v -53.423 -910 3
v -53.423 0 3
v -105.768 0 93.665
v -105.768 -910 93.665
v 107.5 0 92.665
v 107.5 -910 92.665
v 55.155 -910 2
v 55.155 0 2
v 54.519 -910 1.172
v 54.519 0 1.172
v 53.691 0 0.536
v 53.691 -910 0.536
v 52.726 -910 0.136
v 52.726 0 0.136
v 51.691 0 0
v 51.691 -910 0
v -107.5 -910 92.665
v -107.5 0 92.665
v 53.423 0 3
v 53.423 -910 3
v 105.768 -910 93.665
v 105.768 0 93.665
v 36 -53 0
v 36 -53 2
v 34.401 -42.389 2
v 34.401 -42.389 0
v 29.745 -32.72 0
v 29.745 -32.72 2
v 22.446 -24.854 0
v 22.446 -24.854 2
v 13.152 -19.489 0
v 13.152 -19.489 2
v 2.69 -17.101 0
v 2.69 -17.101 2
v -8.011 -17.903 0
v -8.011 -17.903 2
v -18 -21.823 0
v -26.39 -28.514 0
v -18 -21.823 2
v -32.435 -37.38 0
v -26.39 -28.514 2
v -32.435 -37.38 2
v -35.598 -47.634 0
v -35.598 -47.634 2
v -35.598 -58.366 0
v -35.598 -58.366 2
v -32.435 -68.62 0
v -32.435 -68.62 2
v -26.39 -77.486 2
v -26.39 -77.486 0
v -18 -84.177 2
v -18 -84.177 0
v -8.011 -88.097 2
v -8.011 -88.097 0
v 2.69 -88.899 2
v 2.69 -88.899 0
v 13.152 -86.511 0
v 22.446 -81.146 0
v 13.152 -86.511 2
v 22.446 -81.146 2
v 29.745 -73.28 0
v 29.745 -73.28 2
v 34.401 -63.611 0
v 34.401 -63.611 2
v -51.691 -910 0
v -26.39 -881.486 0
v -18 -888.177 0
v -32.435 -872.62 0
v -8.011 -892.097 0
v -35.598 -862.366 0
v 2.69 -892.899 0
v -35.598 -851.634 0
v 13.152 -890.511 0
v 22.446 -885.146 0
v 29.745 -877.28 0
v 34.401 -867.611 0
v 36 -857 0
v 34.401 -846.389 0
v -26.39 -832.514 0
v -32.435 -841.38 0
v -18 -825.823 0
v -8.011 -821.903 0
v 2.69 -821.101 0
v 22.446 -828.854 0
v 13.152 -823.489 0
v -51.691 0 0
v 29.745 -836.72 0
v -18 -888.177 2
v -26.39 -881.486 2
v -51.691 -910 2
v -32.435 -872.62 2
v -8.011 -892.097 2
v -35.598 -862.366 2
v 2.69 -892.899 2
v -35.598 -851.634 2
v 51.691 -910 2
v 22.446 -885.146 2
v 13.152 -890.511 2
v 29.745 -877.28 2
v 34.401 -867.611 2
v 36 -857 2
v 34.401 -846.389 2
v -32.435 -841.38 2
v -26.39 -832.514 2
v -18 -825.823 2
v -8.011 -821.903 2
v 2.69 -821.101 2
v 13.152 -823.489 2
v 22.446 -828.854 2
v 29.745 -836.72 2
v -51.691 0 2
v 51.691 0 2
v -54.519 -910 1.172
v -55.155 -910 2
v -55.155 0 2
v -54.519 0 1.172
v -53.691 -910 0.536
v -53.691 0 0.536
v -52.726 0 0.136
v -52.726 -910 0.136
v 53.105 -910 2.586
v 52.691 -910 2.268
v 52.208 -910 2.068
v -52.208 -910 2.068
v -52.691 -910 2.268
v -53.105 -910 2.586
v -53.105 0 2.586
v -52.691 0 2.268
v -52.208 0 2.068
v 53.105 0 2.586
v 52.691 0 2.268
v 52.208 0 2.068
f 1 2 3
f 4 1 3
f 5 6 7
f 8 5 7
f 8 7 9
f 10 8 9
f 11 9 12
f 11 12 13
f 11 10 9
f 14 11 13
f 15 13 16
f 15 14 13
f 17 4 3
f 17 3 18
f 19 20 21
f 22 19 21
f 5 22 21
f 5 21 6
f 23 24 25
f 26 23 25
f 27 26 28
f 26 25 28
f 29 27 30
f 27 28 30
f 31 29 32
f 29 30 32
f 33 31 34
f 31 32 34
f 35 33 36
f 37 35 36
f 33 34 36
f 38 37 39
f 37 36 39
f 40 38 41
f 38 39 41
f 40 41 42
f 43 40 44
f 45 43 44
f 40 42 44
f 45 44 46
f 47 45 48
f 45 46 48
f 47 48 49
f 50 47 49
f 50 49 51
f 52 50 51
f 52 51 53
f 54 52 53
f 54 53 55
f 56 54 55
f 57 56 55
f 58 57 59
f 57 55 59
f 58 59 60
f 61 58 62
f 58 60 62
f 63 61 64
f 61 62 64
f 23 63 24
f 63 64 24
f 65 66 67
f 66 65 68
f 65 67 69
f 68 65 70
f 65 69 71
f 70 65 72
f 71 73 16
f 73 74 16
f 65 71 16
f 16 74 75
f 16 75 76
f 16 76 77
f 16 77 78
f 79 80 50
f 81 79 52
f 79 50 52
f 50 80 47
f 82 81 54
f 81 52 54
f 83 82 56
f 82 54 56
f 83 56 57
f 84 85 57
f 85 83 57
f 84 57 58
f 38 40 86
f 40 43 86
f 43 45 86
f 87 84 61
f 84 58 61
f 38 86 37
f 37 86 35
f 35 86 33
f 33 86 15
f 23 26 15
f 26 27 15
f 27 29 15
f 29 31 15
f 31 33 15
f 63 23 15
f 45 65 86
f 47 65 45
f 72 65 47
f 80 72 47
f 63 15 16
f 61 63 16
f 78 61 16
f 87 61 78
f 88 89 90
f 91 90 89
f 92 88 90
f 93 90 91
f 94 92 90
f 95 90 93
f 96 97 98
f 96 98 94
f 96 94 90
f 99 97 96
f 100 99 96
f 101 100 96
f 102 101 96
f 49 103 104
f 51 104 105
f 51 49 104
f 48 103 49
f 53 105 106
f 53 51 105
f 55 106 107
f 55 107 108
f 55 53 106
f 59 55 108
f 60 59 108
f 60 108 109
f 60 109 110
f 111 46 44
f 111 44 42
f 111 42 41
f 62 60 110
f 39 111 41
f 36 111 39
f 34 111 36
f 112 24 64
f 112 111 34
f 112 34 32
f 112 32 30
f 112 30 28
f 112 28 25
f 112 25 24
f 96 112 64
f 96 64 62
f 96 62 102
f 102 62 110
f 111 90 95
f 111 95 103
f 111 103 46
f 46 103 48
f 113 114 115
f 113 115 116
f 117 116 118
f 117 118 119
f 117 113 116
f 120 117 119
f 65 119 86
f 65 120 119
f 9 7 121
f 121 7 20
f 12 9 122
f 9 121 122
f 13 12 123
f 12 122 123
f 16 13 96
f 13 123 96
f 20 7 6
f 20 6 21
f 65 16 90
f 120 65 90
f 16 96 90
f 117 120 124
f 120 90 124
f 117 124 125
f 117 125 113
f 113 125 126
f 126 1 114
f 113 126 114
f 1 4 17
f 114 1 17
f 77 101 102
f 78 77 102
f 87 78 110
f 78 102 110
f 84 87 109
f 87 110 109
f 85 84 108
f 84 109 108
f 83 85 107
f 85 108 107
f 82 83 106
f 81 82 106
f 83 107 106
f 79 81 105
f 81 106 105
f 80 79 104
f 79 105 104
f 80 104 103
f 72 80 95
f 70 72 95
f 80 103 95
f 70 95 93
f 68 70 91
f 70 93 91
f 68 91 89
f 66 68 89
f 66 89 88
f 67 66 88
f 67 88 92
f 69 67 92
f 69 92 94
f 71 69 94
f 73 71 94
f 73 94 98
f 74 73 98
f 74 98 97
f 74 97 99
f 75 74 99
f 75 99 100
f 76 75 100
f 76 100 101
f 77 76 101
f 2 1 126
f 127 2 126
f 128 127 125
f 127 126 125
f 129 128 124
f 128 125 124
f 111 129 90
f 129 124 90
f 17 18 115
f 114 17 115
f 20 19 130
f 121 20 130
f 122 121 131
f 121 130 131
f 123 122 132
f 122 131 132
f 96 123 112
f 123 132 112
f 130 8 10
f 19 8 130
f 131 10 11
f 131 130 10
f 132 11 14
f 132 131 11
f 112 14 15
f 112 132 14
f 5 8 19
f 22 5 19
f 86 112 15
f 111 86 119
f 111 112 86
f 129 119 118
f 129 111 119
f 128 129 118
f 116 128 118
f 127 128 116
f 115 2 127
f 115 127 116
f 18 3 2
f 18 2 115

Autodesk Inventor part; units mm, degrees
ref_plane "YZ Plane" through (0, 0, 0) normal (1, 0, 0) x (0, 1, 0)
ref_plane "XZ Plane" through (0, 0, 0) normal (0, 1, 0) x (-1, 0, 0)
ref_plane "XY Plane" through (0, 0, 0) normal (0, 0, 1) x (1, 0, 0)
sketch "Sketch9" plane through (0, 0, 0) normal (0, 0, 1) x (1, 0, 0)
  line L0 (-54, 0) -> (54, 0)
  line L1 (54, 0) -> (54, -910)
  line L2 (54, -910) -> (-54, -910)
  line L3 (-54, -910) -> (-54, 0)
  point P0 (0, 0)
  point P1 (0, 0)
  dimension "d49" = 108
  dimension "d50" = 910
extrude "Plate4" add sketch "Sketch9" along normal blind 2
sketch "Sketch10" plane through (52.2679, 0, 1) normal (0.8660254, 0, -0.5) x (0, 1, 0)
  line L0 (-910, 0) -> (0, 0)
  line L1 (0, 0) -> (0, 107)
  line L2 (0, 107) -> (-910, 107)
  line L3 (-910, 107) -> (-910, 0)
edge flange "Flange2" height 107 angle 60 thickness 2 bend radius 2 thickness toward (0.8660254, 0, -0.5) relief tear relief width 2 relief depth 1 corner gap 2 corner form 0 edges at (54, -455, 2) (-54, -455, 2) wall of the first edge with corners at (52.2679, -910, 1) (52.2679, 0, 1) (105.7679, 0, 93.6647) (105.7679, -910, 93.6647)
bend "Bend2"
corner "Corner2"
sketch "Sketch11" plane through (0, 0, 2) normal (0, 0, 1) x (1, 0, 0)
  circle A0 centre (0, -53) radius 36
  circle A1 centre (0, -857) radius 36
  line L0 (-51.6906, 0) -> (51.6906, 0) projected
  line L1 (-51.6906, -910) -> (51.6906, -910) projected
  line L2 (0, 0) -> (0, -17)
  line L3 (0, -910) -> (0, -893)
  point P0 (0, 0)
  dimension "d62" = 72
  dimension "d68" = 17
  dimension "d69" = 804
extrude "Cut3" cut sketch "Sketch11" against normal blind 2
equation "\"d65\" = Thickness"
equation "\"d51\" = Thickness"
equation "\"d52\" = BendReliefWidth"
equation "\"d53\" = BendReliefDepth"
equation "\"d54\" = MinimumRemnant"
equation "\"d55\" = TransitionRadius"
equation "\"d58\" = BendRadius"
equation "\"d59\" = CornerReliefSize"
equation "\"d60\" = GapSize"
equation "\"d61\" = JacobiRadiusSize"
equation "\"BendRadius\" = Thickness"
equation "\"BendReliefWidth\" = Thickness"
equation "\"BendReliefDepth\" = 0.5 * Thickness"
equation "\"CornerReliefSize\" = 4 * Thickness"
equation "\"MinimumRemnant\" = 2 * Thickness"
equation "\"TransitionRadius\" = BendRadius"
equation "\"JacobiRadiusSize\" = BendRadius"
equation "\"GapSize\" = Thickness"
equation "\"Octaeder_side\" = d41"
equation "\"Octaeder_flange_lenth\" = d42"
equation "\"Thickness\" = 2"
equation "\"d41\" = 55.918831"
equation "\"d42\" = 72.5"
properties part number "DSB 122 hex side 1"
